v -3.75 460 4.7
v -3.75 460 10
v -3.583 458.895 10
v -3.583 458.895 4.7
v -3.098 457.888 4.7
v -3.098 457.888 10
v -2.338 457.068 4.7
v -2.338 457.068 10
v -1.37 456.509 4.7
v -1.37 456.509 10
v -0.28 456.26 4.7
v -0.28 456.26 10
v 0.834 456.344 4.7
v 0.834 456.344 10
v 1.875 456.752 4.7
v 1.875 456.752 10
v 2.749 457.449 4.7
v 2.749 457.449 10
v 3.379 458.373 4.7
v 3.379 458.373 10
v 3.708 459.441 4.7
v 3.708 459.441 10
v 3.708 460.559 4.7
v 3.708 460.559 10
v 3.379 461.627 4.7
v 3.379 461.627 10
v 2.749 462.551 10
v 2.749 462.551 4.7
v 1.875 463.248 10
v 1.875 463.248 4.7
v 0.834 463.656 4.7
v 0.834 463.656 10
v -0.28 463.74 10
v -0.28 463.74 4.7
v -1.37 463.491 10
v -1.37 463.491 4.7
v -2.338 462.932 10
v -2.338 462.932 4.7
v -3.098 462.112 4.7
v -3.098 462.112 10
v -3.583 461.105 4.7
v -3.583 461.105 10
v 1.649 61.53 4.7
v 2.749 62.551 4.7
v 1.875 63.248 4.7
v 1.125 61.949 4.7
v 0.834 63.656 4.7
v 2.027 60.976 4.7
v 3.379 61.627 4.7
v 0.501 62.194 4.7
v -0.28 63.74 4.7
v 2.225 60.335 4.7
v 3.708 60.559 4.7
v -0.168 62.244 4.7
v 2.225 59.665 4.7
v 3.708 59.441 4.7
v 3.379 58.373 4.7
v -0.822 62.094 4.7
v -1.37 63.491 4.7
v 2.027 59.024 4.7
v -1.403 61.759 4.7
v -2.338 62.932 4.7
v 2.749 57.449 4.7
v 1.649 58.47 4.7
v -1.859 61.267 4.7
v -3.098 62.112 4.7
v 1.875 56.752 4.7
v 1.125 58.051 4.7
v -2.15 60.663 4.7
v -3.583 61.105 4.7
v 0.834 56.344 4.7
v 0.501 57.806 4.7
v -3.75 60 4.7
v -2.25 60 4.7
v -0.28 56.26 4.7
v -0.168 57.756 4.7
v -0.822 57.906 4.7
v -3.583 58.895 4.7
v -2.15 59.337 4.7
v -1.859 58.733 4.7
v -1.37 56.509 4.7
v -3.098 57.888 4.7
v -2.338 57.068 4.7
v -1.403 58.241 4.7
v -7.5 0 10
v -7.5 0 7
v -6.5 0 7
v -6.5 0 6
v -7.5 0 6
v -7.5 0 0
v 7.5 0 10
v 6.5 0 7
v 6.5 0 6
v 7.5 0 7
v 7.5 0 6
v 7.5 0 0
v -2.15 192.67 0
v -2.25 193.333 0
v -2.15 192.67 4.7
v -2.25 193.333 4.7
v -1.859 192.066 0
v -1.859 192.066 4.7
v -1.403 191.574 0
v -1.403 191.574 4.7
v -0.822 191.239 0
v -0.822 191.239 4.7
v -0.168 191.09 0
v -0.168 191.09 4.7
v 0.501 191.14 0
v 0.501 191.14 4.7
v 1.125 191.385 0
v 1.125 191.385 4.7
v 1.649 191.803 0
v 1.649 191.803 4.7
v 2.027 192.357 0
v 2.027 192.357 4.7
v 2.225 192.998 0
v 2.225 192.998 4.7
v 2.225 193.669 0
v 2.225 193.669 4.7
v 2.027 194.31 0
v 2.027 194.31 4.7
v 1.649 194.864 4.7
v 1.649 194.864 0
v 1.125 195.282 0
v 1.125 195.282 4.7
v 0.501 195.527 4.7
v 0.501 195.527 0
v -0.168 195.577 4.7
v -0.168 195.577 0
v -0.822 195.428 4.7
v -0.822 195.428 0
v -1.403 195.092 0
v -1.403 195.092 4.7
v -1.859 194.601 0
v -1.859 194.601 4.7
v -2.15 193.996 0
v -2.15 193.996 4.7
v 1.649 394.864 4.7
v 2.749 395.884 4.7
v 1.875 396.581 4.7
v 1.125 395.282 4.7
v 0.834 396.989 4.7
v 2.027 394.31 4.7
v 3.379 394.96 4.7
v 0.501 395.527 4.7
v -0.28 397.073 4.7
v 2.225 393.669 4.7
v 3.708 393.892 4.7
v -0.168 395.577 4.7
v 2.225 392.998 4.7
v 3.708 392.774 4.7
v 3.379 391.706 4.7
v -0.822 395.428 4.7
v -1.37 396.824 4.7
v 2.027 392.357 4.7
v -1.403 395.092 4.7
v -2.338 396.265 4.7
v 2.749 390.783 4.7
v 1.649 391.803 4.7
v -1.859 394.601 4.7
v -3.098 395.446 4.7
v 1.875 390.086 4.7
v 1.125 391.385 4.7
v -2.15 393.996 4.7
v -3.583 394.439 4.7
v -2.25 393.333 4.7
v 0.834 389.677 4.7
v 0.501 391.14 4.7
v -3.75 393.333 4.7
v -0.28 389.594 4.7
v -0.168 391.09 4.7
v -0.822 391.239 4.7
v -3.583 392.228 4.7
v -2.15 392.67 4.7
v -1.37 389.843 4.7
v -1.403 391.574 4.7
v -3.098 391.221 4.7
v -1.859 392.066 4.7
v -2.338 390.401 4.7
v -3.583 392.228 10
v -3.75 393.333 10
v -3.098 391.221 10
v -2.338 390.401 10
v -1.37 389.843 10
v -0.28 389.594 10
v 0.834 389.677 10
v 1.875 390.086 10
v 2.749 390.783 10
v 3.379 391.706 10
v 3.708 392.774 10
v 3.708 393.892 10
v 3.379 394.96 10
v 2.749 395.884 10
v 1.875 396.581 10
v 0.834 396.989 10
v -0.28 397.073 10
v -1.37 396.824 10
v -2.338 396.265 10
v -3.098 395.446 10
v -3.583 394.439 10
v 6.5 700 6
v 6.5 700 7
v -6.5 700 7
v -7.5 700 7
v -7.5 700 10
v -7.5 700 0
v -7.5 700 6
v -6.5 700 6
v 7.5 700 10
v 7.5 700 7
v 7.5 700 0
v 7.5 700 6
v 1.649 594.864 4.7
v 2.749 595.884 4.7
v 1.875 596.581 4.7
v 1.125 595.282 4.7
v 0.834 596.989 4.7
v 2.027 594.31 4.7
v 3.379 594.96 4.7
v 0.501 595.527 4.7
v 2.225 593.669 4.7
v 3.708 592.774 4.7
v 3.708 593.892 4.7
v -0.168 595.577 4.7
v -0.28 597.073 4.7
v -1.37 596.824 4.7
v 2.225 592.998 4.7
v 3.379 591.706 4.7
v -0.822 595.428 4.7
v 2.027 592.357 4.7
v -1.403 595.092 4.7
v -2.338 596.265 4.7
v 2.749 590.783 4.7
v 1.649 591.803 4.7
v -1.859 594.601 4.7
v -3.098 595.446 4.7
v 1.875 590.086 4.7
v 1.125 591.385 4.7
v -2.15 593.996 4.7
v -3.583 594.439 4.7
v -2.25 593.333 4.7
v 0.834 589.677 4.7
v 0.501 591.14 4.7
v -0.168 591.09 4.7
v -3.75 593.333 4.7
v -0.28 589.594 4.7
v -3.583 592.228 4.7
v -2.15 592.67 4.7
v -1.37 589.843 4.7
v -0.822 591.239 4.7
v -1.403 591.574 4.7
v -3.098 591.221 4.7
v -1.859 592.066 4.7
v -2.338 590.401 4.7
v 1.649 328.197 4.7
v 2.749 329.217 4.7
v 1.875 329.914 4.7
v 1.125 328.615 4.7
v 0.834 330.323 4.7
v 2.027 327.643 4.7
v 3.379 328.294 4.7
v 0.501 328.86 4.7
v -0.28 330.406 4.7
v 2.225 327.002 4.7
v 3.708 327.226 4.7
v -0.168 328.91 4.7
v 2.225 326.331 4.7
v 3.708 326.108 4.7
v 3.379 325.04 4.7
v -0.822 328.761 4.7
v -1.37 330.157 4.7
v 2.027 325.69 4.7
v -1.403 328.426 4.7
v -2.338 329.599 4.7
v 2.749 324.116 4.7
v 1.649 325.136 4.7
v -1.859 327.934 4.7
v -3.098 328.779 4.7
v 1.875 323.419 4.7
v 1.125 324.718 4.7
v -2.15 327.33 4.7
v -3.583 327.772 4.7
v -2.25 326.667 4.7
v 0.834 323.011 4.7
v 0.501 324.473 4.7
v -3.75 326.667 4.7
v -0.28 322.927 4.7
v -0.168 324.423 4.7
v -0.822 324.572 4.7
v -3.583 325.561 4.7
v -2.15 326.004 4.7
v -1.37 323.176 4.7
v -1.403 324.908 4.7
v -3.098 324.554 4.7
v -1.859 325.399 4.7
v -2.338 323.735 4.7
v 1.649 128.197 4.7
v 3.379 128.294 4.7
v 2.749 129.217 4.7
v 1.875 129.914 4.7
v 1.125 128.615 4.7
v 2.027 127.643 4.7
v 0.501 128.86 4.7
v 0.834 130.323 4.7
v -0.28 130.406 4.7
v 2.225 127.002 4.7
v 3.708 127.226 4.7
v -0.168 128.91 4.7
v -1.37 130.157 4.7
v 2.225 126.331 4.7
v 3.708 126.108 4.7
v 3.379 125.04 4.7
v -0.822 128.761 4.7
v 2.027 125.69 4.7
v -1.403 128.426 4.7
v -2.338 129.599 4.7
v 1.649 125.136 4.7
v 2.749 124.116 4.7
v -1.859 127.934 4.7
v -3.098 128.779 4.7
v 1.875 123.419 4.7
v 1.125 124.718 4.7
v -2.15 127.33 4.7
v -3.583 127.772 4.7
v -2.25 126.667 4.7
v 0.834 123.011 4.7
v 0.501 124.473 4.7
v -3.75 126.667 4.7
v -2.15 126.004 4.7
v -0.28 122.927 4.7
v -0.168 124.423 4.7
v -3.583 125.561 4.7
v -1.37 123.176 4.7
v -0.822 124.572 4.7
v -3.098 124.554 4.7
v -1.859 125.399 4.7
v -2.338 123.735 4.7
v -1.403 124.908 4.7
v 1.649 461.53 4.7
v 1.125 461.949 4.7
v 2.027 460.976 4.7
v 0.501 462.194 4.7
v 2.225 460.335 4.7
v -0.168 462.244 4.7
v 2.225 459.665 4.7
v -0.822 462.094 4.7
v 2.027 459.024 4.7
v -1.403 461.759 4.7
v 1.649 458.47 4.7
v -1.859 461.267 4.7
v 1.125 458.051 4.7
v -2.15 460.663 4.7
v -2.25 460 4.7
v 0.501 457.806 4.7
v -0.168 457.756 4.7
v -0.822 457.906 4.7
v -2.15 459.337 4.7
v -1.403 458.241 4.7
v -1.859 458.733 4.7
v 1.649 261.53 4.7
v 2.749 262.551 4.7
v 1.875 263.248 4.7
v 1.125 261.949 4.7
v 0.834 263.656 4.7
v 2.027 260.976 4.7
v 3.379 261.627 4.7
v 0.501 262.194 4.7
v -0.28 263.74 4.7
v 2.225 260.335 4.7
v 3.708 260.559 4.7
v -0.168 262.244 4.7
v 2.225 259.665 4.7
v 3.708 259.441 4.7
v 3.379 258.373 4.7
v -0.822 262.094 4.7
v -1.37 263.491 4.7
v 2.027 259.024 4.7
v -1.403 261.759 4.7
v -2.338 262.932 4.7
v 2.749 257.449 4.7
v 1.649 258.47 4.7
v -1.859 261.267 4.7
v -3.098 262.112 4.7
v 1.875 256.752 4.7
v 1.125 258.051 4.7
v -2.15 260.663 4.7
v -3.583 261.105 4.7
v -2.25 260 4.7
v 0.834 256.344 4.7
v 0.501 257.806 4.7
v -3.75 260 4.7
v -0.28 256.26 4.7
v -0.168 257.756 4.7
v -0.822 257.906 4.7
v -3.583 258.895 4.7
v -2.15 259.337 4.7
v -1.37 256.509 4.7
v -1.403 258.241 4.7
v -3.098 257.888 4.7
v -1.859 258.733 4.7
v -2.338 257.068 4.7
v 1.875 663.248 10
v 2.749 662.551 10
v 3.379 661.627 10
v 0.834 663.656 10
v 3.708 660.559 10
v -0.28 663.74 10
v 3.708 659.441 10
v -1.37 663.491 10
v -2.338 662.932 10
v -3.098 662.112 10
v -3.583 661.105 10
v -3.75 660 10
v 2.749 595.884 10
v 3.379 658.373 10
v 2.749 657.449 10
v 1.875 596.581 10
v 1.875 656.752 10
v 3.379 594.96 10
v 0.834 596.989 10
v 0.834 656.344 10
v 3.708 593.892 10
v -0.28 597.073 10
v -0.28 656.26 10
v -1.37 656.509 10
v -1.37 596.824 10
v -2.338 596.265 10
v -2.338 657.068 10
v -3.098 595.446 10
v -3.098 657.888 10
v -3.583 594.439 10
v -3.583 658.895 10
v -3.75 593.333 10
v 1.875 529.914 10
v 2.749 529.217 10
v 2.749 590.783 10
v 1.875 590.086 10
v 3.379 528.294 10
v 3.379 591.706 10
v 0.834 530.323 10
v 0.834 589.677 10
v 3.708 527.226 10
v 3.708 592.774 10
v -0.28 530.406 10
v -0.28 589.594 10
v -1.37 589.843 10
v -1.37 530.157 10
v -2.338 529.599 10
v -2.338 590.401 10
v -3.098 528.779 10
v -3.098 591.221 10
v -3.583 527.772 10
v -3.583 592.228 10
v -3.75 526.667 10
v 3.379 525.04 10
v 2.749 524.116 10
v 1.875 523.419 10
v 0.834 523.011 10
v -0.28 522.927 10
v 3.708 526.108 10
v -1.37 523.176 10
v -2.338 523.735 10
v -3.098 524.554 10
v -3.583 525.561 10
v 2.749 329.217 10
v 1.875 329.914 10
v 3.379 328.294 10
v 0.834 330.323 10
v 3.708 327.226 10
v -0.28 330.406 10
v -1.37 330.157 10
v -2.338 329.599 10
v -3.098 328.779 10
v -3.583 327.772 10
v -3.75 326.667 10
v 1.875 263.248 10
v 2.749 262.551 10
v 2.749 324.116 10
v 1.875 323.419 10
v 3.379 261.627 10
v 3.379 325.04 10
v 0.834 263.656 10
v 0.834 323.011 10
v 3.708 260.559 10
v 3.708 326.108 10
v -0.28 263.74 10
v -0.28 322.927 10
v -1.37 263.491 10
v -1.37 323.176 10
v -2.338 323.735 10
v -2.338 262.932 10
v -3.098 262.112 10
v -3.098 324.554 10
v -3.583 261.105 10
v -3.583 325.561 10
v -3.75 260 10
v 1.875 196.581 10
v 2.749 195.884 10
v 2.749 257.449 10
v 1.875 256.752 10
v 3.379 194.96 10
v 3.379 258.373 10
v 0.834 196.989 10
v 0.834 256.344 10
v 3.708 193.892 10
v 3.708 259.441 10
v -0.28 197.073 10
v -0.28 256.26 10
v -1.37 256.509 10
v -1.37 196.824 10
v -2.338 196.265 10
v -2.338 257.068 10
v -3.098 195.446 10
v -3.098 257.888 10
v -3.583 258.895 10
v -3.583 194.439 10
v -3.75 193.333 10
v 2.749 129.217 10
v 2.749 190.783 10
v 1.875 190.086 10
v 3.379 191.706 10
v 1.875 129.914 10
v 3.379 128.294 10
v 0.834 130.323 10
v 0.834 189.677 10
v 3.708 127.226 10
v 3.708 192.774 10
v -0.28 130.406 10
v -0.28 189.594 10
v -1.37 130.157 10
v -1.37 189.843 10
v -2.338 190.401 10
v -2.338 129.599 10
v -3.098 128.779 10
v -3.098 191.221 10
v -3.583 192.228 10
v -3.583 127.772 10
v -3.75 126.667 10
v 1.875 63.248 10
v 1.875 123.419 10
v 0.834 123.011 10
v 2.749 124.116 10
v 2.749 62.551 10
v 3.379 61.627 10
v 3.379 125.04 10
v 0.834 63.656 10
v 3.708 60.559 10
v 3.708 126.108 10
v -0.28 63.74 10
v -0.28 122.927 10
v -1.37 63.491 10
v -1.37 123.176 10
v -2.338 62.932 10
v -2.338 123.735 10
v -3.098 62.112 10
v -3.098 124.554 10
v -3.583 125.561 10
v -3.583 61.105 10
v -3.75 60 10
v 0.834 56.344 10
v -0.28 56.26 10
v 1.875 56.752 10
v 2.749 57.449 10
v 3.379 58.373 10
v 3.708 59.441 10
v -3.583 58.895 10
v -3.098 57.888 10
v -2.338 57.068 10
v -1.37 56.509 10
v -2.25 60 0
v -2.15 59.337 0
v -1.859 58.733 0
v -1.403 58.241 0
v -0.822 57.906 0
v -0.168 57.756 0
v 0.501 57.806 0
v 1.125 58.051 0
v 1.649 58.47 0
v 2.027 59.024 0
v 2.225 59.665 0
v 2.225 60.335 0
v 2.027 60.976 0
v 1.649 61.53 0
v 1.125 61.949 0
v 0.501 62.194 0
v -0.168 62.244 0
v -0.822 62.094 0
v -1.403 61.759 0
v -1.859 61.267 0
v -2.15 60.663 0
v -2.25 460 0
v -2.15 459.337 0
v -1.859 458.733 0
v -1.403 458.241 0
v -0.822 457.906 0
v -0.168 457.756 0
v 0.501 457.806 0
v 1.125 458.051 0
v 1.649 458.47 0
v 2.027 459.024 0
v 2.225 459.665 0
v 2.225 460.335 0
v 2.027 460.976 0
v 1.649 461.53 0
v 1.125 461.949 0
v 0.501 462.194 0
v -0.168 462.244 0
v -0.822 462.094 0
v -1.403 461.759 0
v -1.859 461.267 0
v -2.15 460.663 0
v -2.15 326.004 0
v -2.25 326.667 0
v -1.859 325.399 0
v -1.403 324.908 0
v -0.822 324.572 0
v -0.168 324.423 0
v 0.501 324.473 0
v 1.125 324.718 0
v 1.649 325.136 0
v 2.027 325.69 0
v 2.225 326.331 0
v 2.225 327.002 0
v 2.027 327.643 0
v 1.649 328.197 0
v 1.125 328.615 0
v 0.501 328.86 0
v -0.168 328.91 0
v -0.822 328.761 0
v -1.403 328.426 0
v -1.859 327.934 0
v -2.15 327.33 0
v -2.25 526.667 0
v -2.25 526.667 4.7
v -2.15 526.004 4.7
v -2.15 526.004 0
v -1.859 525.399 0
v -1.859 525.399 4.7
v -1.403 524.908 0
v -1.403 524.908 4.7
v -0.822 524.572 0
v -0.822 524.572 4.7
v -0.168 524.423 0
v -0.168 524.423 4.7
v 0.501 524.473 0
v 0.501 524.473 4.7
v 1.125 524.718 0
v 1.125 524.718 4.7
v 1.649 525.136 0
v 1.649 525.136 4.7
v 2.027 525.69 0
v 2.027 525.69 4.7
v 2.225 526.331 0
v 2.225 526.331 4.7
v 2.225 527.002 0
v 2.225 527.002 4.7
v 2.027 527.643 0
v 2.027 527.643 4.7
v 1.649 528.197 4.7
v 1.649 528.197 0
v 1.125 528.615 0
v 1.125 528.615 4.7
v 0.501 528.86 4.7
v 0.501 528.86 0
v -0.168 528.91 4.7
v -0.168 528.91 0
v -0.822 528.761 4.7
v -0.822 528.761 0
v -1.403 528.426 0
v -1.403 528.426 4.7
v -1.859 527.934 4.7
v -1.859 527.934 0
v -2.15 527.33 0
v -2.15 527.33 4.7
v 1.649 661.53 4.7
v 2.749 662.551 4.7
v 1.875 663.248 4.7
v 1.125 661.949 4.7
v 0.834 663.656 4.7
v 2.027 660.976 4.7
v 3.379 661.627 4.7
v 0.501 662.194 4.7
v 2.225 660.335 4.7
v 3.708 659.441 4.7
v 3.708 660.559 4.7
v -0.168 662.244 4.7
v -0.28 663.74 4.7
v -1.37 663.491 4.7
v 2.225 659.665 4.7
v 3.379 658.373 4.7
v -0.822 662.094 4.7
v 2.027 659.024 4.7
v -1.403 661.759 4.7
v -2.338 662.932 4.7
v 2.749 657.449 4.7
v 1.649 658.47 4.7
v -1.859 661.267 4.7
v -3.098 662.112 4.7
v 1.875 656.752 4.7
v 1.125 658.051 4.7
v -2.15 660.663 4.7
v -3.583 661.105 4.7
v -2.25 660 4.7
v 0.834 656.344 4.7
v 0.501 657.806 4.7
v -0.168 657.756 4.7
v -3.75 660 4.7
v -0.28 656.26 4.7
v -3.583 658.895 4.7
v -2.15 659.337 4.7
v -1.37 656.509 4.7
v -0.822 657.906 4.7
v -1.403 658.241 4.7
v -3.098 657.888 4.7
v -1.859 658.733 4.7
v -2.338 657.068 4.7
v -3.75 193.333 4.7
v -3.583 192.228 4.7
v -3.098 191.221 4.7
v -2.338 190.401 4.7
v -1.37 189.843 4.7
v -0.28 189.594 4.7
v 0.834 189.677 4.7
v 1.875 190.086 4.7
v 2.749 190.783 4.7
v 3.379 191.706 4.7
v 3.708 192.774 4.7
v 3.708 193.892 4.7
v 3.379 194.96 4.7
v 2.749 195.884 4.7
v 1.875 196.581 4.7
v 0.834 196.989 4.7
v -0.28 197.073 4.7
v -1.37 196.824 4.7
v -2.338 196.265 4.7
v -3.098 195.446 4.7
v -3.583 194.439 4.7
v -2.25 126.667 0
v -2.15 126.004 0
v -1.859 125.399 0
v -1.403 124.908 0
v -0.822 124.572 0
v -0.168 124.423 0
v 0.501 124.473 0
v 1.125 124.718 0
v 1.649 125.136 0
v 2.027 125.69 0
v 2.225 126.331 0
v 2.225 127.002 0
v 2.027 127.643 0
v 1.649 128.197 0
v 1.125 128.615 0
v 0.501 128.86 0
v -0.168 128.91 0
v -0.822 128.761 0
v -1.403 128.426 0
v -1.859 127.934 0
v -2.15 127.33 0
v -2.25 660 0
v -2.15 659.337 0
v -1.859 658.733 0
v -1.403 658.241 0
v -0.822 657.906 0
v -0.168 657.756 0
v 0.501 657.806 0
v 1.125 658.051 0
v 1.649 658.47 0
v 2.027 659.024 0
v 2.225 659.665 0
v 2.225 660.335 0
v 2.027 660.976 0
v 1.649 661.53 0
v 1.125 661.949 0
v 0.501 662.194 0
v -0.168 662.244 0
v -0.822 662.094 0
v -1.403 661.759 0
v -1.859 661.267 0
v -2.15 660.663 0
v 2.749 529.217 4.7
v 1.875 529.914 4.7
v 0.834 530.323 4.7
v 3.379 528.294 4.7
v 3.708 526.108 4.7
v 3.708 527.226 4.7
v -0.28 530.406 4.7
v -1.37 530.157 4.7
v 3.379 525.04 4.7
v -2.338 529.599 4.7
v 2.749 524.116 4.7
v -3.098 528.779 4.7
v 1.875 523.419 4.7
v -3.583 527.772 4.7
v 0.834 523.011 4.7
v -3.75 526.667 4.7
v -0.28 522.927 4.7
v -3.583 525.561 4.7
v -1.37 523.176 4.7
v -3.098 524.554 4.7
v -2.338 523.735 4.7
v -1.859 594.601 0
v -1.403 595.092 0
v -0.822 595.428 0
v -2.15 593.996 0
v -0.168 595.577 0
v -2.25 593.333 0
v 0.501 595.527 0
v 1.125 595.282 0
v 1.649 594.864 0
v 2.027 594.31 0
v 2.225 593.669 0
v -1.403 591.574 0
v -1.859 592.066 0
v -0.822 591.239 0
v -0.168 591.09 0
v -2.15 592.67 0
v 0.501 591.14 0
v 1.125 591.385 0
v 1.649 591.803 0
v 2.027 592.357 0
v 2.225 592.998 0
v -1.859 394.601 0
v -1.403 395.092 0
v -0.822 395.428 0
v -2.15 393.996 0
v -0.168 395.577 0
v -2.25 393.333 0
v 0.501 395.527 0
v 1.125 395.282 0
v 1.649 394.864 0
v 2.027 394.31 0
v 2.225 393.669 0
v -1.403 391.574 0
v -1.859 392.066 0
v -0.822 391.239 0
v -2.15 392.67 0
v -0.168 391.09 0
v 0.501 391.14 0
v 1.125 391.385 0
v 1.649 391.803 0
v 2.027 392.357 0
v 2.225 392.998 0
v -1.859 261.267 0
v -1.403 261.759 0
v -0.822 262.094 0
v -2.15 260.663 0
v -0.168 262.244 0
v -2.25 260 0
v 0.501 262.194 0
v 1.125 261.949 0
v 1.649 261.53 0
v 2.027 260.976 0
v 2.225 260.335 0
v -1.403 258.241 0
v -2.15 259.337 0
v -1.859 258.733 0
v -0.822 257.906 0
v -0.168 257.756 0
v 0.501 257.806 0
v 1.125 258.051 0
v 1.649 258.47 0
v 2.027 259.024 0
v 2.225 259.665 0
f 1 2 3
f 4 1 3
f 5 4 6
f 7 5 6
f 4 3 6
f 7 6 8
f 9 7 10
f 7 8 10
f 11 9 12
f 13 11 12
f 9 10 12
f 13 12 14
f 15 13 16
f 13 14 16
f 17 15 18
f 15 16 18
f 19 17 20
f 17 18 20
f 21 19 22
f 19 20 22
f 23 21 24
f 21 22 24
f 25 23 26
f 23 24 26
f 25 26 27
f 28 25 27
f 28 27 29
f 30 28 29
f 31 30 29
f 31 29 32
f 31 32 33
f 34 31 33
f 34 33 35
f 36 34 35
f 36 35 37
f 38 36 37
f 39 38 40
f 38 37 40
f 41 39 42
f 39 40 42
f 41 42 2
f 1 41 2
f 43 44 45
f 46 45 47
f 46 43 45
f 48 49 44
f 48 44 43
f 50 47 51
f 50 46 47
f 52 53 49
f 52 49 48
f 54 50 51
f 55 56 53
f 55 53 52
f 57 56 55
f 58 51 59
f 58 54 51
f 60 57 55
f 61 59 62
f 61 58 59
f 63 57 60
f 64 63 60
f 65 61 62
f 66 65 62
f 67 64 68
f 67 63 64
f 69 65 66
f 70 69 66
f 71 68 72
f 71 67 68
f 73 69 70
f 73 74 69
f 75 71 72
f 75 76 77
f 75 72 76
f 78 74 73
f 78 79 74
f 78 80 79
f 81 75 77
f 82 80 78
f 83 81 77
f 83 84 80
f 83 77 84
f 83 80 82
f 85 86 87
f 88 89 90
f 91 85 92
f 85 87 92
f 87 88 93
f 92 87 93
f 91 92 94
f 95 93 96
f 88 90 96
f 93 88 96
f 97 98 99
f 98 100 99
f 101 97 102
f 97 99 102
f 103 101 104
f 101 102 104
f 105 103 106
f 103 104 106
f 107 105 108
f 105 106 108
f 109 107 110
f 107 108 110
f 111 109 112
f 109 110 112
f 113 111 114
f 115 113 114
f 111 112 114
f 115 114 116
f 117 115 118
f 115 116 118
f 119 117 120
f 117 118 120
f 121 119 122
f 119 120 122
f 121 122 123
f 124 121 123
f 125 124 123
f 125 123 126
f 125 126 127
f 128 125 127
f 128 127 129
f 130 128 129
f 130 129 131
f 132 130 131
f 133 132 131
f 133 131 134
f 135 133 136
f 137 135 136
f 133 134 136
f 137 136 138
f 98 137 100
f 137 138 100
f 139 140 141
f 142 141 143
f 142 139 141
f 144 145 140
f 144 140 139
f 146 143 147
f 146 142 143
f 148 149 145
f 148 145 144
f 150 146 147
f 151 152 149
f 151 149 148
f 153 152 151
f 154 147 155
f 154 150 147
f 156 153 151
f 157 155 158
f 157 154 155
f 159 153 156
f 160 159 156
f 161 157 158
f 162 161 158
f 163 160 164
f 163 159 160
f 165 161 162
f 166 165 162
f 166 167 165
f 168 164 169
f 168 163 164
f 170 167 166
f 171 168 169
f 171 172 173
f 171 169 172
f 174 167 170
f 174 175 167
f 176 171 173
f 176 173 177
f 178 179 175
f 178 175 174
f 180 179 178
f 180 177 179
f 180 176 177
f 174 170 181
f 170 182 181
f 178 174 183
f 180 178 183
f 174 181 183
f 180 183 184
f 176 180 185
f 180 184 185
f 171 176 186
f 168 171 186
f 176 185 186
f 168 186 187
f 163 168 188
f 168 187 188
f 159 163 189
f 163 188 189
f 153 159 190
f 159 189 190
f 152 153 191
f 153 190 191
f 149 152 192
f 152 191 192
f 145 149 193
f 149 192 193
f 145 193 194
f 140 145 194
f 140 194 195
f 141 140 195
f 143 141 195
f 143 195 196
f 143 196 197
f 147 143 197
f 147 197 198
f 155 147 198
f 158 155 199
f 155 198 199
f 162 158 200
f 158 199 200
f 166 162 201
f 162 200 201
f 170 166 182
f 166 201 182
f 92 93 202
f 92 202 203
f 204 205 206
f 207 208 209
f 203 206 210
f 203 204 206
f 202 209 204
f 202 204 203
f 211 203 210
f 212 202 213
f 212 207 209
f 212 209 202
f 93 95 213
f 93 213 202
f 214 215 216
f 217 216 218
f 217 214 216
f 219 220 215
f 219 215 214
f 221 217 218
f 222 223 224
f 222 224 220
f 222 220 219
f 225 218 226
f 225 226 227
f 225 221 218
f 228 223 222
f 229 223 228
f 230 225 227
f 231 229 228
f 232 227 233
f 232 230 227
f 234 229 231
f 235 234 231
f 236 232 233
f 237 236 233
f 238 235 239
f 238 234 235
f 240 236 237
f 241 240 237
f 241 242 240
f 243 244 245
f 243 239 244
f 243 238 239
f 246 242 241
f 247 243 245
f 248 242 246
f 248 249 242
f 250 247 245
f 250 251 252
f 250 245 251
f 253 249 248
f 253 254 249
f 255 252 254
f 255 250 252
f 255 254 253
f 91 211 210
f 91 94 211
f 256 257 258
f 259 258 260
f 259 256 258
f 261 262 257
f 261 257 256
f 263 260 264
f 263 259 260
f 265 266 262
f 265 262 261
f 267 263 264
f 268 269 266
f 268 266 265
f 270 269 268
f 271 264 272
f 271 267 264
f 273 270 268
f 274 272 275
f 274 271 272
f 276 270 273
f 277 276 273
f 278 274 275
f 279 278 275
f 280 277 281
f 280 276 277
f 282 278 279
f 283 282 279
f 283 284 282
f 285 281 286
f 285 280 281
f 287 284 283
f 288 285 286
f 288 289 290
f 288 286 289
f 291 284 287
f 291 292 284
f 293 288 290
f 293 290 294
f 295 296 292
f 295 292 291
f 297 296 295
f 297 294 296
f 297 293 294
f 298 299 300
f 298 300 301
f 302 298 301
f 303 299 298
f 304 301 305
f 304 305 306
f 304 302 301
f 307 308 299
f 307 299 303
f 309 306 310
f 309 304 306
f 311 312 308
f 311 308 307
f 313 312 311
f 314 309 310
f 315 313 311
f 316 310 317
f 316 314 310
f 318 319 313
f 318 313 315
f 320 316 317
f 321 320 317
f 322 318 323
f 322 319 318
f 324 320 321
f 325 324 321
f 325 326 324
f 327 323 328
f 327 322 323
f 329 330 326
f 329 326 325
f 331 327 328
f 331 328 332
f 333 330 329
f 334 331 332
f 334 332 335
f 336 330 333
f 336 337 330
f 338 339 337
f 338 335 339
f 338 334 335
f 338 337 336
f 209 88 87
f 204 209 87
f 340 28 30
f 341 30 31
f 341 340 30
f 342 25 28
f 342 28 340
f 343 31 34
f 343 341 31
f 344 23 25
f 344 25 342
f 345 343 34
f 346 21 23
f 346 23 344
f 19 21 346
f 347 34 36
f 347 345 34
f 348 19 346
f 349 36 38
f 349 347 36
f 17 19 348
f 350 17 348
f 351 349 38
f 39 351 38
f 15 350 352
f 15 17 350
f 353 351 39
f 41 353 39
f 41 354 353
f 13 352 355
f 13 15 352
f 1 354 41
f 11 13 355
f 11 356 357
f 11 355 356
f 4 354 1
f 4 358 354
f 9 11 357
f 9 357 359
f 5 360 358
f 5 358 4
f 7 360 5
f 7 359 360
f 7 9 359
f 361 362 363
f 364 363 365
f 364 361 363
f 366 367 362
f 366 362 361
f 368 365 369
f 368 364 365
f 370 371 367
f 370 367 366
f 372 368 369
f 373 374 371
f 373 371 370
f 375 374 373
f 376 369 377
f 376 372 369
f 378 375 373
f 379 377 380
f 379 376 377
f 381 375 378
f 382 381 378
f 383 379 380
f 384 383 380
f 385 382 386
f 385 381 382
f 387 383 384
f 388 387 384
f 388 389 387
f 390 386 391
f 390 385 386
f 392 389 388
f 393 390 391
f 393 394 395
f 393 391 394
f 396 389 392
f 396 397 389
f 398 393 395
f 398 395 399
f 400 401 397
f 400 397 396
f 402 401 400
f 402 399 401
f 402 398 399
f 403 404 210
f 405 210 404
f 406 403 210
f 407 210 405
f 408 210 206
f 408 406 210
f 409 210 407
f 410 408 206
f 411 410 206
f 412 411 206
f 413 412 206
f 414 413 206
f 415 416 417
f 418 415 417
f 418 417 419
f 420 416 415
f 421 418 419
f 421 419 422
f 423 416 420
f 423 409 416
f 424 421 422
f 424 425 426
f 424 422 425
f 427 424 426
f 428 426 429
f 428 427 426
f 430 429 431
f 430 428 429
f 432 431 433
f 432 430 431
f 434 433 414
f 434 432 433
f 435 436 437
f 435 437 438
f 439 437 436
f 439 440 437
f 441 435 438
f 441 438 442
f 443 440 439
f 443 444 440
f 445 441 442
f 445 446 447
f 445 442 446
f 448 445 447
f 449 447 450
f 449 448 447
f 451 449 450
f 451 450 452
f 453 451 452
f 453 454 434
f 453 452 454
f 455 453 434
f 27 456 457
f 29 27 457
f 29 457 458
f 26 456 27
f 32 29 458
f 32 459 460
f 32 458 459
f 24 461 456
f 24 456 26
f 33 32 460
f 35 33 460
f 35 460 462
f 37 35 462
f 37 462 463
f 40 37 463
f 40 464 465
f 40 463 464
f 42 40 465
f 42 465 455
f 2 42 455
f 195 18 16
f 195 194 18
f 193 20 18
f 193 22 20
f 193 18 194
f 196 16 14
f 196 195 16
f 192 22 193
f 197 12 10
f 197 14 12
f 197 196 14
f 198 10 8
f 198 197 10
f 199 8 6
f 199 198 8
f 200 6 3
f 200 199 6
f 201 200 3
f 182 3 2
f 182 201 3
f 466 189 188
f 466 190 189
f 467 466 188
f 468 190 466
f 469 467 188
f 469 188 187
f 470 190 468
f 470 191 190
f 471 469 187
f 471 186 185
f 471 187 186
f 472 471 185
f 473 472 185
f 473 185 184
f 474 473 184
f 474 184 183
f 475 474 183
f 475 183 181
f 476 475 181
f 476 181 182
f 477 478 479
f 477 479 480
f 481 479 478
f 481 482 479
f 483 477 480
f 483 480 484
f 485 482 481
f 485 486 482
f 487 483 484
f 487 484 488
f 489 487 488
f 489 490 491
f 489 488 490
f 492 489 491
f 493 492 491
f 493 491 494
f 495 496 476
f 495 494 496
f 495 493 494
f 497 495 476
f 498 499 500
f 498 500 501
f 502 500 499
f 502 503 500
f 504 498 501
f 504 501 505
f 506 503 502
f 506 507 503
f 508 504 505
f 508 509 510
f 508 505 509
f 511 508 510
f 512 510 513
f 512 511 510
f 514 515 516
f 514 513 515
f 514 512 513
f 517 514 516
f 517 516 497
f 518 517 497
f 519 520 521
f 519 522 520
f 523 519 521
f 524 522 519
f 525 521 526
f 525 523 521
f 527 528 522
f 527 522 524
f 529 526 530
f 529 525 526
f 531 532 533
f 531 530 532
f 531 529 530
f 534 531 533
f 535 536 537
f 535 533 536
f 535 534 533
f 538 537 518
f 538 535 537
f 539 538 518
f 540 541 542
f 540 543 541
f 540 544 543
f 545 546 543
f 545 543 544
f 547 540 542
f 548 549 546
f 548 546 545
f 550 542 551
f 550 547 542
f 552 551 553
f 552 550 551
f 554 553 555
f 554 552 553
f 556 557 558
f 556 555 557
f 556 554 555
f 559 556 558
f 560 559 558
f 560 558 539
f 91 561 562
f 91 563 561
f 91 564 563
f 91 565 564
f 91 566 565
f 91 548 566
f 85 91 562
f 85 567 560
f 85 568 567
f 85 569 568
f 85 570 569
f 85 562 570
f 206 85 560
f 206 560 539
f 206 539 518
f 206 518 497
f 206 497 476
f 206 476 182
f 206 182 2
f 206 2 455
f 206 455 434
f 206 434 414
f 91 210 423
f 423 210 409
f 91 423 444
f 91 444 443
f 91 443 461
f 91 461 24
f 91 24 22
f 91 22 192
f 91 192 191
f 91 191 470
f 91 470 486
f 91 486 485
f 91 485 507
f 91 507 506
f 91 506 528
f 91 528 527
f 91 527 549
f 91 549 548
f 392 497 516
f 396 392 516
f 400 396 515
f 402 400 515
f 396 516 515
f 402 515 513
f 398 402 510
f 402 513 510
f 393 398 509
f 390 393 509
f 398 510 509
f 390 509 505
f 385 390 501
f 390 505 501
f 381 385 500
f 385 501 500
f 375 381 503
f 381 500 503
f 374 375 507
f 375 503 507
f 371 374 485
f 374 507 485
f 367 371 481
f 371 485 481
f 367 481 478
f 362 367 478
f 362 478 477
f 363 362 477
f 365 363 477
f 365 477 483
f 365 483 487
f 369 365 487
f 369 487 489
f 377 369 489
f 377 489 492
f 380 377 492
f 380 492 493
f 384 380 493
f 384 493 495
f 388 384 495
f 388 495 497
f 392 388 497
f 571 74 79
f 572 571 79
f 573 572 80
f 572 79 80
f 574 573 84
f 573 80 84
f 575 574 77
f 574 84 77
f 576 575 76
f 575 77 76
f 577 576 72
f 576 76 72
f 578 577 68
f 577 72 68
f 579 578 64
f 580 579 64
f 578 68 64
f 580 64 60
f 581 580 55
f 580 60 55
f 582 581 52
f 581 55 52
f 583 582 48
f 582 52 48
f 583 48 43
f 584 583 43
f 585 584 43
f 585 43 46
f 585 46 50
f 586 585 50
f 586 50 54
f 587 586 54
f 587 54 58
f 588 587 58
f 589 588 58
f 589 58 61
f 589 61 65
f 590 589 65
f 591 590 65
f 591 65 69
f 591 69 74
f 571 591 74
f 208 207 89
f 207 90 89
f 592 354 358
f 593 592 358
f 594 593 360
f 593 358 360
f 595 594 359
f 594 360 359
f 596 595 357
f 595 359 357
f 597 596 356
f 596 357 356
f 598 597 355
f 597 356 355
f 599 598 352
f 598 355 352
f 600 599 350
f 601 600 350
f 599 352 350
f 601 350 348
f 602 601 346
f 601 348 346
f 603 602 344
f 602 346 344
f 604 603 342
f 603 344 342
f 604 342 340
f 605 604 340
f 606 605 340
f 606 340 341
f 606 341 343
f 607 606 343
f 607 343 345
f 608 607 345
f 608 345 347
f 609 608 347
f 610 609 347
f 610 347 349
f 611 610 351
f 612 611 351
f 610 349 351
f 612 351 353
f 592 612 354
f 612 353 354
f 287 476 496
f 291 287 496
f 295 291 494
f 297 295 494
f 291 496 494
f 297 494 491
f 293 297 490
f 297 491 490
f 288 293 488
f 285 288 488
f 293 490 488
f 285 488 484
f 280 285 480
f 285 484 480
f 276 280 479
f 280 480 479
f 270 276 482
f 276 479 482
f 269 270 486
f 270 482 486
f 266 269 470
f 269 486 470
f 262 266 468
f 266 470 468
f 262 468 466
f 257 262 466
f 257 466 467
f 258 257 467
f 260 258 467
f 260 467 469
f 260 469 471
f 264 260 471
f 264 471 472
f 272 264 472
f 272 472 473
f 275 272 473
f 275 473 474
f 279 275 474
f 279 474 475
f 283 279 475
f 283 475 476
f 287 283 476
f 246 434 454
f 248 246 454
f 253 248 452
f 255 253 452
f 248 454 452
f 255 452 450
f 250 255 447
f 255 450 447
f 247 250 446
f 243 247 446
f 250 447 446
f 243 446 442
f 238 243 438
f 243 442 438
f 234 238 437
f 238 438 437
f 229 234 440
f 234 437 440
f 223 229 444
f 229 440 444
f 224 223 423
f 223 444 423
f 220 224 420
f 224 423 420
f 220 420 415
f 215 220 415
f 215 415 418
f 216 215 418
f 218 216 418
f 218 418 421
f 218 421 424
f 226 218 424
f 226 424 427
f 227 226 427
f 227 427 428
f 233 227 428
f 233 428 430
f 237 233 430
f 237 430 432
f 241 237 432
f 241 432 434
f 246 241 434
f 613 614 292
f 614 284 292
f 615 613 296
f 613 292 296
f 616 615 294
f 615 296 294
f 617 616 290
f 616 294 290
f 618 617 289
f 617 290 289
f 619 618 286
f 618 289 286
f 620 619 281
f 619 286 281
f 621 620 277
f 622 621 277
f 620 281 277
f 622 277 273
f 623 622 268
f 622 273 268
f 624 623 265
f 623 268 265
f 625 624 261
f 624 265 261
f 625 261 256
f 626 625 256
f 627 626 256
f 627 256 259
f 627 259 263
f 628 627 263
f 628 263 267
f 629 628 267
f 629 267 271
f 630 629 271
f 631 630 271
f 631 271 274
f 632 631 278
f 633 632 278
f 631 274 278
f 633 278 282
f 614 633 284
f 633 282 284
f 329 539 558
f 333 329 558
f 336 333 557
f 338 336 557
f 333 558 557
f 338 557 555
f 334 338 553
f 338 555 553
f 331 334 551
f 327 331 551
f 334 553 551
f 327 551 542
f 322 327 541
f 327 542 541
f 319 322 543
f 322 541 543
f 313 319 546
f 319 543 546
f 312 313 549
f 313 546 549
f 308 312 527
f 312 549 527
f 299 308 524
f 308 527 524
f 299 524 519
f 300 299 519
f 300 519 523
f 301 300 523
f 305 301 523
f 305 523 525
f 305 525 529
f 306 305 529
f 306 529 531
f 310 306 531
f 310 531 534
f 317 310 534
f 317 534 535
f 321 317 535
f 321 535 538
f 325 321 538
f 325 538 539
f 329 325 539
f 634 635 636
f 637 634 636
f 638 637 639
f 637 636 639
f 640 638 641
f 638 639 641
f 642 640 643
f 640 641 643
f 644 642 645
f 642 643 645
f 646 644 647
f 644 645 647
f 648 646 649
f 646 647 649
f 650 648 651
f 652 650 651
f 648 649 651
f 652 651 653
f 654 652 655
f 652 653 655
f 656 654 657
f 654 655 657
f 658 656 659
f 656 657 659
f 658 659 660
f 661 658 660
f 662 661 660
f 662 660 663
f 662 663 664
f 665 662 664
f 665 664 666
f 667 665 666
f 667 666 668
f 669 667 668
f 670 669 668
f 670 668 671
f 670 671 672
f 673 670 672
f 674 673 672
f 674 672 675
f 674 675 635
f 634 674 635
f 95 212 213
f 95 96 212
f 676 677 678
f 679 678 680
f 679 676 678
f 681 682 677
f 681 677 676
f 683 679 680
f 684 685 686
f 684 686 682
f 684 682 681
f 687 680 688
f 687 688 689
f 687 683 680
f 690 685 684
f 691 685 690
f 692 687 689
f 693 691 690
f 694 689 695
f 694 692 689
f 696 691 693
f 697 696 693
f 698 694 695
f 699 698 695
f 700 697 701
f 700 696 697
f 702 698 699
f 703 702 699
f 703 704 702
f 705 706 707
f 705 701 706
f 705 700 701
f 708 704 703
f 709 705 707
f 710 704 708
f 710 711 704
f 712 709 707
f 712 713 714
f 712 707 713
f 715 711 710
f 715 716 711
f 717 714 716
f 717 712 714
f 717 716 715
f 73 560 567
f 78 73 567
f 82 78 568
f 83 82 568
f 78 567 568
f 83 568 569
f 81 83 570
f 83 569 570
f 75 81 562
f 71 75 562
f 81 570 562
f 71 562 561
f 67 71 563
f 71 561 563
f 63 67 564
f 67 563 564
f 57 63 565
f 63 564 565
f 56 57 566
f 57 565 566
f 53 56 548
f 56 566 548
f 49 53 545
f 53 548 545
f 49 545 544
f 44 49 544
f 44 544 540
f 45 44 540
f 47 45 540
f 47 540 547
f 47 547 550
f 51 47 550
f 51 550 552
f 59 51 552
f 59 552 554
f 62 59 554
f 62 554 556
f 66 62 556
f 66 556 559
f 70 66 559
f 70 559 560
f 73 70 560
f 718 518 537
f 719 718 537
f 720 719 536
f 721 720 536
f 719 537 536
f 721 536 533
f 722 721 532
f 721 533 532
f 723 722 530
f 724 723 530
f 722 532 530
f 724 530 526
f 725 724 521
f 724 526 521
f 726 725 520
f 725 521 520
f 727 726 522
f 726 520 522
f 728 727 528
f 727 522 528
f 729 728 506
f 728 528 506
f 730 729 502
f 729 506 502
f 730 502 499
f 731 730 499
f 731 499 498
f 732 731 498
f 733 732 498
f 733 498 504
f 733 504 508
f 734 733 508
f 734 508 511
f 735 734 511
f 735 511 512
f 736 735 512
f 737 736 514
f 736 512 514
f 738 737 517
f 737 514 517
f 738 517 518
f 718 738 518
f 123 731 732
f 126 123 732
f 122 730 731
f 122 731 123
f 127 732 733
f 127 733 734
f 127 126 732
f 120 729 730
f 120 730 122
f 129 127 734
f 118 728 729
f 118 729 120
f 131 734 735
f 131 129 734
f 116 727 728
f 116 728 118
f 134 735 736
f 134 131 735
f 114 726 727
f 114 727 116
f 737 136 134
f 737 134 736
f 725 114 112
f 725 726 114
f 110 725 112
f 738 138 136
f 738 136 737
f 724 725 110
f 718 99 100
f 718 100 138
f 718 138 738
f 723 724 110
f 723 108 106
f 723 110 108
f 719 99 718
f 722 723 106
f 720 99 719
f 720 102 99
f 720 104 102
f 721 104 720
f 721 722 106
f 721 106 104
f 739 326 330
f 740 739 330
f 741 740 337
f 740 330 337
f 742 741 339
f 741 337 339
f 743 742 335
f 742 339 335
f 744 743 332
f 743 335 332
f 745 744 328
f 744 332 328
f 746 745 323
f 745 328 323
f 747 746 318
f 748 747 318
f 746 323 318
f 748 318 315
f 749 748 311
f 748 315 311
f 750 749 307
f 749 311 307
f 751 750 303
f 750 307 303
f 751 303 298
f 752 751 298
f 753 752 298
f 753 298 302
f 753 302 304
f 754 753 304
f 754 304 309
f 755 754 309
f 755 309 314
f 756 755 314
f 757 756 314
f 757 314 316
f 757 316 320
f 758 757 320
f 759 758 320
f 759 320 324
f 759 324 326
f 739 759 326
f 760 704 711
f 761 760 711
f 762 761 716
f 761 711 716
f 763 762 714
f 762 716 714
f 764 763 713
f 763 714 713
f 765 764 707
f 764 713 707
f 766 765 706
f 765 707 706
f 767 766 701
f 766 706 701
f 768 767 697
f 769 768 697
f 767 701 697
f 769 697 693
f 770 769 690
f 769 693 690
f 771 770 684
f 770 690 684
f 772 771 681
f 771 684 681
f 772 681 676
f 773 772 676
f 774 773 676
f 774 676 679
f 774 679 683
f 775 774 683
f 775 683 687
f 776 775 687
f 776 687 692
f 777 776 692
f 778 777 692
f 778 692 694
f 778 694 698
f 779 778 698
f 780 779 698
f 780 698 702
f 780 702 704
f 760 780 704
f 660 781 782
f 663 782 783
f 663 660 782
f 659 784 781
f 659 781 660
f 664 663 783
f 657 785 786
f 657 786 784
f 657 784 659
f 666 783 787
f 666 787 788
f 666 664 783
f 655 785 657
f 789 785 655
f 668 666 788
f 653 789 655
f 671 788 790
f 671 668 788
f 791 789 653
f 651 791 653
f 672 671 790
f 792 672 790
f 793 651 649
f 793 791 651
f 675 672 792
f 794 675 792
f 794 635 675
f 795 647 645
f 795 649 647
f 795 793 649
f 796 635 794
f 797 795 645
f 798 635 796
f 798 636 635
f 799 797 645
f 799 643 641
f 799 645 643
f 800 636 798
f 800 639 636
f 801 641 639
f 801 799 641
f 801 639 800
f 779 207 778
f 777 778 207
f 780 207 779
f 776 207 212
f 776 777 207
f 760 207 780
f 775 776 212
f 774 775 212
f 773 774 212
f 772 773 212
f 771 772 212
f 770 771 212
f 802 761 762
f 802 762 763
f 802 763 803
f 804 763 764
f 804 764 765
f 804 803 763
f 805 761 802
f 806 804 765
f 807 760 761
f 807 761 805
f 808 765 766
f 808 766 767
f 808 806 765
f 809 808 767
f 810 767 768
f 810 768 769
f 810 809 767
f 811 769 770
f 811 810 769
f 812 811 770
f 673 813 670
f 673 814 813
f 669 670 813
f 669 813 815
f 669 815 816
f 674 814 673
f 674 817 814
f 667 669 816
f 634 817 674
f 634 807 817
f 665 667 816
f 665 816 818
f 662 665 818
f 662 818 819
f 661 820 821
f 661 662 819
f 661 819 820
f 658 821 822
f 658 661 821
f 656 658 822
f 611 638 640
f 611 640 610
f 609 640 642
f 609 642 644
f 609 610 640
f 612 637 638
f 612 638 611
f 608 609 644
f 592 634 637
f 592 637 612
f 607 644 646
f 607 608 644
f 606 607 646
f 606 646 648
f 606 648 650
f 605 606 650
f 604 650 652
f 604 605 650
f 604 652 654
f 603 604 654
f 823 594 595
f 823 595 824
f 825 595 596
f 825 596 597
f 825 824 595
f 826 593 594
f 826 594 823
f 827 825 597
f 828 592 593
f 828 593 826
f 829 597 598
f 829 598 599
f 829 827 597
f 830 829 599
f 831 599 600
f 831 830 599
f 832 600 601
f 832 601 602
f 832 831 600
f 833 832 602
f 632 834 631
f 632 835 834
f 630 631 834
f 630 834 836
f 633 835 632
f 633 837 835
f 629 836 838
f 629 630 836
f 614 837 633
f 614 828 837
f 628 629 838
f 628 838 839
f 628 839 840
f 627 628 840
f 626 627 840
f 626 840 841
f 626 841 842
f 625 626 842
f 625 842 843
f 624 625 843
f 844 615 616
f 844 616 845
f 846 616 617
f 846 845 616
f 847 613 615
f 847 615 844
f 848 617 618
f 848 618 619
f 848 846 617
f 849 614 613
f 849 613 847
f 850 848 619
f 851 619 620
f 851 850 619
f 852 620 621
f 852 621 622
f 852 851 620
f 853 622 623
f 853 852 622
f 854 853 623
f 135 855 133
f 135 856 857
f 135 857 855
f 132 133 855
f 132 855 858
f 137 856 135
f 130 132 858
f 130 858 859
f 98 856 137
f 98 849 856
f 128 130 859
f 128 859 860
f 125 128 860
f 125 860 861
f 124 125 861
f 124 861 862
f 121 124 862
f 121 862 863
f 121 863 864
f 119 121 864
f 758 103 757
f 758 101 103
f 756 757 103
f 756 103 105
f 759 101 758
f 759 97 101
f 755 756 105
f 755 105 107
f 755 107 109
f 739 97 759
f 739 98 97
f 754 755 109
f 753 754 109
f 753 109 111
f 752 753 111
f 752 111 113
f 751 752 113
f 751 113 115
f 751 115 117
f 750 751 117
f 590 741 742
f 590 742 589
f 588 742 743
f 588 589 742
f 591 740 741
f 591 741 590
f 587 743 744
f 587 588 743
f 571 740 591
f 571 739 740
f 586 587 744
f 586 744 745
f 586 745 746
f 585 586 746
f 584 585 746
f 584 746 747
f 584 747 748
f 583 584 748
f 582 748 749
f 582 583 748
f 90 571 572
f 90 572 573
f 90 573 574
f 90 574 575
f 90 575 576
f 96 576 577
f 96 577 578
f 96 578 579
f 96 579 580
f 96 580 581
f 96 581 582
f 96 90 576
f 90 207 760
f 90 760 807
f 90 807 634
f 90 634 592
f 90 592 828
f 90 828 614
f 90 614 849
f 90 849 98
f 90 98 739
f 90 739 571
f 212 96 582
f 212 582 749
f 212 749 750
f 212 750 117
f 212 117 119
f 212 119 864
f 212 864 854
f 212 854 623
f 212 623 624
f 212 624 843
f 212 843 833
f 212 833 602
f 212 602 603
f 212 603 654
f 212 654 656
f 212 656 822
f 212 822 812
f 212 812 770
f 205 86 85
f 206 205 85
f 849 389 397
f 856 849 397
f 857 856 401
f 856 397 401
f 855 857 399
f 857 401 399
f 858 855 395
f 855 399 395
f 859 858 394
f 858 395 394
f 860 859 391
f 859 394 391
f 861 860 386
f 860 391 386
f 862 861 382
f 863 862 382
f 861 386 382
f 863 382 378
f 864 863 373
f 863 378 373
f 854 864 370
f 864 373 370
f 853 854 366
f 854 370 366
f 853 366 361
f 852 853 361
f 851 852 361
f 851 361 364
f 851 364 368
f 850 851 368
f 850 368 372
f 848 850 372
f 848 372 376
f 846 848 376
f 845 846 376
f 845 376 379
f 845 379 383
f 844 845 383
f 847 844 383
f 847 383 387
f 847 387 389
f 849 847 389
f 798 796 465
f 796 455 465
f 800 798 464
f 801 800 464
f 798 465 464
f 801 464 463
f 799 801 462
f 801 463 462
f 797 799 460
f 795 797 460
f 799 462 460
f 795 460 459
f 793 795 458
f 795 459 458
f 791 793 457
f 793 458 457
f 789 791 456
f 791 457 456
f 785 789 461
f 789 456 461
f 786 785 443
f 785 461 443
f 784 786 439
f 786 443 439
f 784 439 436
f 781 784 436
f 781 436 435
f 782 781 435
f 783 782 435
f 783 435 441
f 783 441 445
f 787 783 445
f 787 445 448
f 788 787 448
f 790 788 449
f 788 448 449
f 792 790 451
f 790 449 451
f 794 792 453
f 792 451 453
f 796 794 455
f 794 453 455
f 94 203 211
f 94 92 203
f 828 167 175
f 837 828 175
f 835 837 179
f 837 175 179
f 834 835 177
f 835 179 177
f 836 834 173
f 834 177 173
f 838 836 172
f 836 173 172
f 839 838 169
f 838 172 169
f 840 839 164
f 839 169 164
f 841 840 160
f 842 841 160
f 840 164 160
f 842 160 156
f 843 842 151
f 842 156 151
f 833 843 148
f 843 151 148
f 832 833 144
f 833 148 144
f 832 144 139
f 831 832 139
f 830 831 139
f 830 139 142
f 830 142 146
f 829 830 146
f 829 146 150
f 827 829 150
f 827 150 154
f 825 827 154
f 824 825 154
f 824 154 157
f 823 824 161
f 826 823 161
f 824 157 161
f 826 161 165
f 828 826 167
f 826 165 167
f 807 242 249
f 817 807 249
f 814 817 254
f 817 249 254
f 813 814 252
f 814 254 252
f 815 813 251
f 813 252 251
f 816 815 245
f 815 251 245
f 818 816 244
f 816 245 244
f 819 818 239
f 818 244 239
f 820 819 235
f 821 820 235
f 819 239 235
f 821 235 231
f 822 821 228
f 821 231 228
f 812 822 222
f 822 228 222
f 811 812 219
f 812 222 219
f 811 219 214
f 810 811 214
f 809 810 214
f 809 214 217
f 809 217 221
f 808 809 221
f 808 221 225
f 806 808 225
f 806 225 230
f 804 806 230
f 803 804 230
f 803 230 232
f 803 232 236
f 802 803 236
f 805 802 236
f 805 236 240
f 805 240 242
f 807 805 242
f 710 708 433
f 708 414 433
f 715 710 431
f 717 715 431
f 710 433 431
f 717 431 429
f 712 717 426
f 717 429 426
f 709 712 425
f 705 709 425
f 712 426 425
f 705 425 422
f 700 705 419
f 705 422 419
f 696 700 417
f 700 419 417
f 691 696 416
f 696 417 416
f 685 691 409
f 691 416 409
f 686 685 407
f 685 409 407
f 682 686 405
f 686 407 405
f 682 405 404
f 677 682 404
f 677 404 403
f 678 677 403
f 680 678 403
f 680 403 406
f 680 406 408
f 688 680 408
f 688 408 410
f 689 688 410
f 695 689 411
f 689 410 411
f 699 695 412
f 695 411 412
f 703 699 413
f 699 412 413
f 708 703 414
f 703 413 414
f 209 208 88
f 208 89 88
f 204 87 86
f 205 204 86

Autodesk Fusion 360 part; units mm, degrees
sketch "Sketch1" plane through (0, 0, 0) normal (0, 1, 0) x (1, 0, 0)
  line L0 (0, 0) -> (7.5, 0)
  line L1 (7.5, 0) -> (7.5, -6)
  line L2 (7.5, -6) -> (6.5, -6)
  line L3 (6.5, -6) -> (6.5, -7)
  line L4 (6.5, -7) -> (7.5, -7)
  line L5 (7.5, -7) -> (7.5, -10)
  line L6 (7.5, -10) -> (0, -10)
  line L7 (-7.5, -7) -> (-7.5, -10)
  line L8 (0, 0) -> (-7.5, 0)
  line L9 (-7.5, -6) -> (-6.5, -6)
  line L10 (-7.5, -10) -> (0, -10)
  line L11 (-7.5, 0) -> (-7.5, -6)
  line L12 (-6.5, -6) -> (-6.5, -7)
  line L13 (-6.5, -7) -> (-7.5, -7)
  dimension "d1" = 7.5
  dimension "d2" = 1
  dimension "d3" = 1
  dimension "d4" = 1
  dimension "d5" = 6
  dimension "d6" = 3
  dimension "d7" = 7.5
extrude "Extrude1" add sketch "Sketch1" along normal blind 700
sketch "Sketch2" plane through (0, 0, 10) normal (0, 0, 1) x (-1, 0, 0)
  line L0 (7.5, 0) -> (-7.5, 0)
  line L1 (-7.5, 0) -> (-7.5, -700)
  line L2 (-7.5, -700) -> (7.5, -700)
  line L3 (7.5, -700) -> (7.5, 0)
  circle A0 centre (0, -60) radius 2.25
  circle A1 centre (0, -126.6667) radius 2.25
  circle A2 centre (0, -193.3333) radius 2.25
  circle A3 centre (0, -260) radius 2.25
  circle A4 centre (0, -326.6667) radius 2.25
  circle A5 centre (0, -393.3333) radius 2.25
  circle A6 centre (0, -460) radius 2.25
  circle A7 centre (0, -526.6667) radius 2.25
  circle A8 centre (0, -593.3333) radius 2.25
  circle A9 centre (0, -660) radius 2.25
  dimension "d10" = 60
  dimension "d12" = 4.5
extrude "Extrude2" cut sketch "Sketch2" against normal up to surface (10 mm away) contours A0 | A1 | A2 | A3 | A4 | A5 | A6 | A7 | A8 | A9
sketch "Sketch3" plane through (0, 0, 10) normal (0, 0, 1) x (-1, 0, 0)
  circle A0 centre (0, -526.6667) radius 2.25
  circle A1 centre (0, -260) radius 2.25
  circle A2 centre (0, -60) radius 2.25
  circle A3 centre (0, -326.6667) radius 2.25
  circle A4 centre (0, -593.3333) radius 2.25
  circle A5 centre (0, -460) radius 2.25
  circle A6 centre (0, -193.3333) radius 2.25
  circle A7 centre (0, -126.6667) radius 2.25
  circle A8 centre (0, -393.3333) radius 2.25
  circle A9 centre (0, -660) radius 2.25
  line L0 (7.5, 0) -> (-7.5, 0)
  line L1 (-7.5, 0) -> (-7.5, -700)
  line L2 (-7.5, -700) -> (7.5, -700)
  line L3 (7.5, -700) -> (7.5, 0)
  circle A10 centre (0, -60) radius 3.75
  circle A11 centre (0, -126.6667) radius 3.75
  circle A12 centre (0, -193.3333) radius 3.75
  circle A13 centre (0, -260) radius 3.75
  circle A14 centre (0, -326.6667) radius 3.75
  circle A15 centre (0, -393.3333) radius 3.75
  circle A16 centre (0, -460) radius 3.75
  circle A17 centre (0, -526.6667) radius 3.75
  circle A18 centre (0, -593.3333) radius 3.75
  circle A19 centre (0, -660) radius 3.75
  dimension "d19" = 7.5
  dimension "d22" = 0
  dimension "d23" = -600
extrude "Extrude3" cut sketch "Sketch3" against normal blind 5.3 contours A10 | A11 | A12 | A13 | A14 | A15 | A16 | A17 | A18 | A19
